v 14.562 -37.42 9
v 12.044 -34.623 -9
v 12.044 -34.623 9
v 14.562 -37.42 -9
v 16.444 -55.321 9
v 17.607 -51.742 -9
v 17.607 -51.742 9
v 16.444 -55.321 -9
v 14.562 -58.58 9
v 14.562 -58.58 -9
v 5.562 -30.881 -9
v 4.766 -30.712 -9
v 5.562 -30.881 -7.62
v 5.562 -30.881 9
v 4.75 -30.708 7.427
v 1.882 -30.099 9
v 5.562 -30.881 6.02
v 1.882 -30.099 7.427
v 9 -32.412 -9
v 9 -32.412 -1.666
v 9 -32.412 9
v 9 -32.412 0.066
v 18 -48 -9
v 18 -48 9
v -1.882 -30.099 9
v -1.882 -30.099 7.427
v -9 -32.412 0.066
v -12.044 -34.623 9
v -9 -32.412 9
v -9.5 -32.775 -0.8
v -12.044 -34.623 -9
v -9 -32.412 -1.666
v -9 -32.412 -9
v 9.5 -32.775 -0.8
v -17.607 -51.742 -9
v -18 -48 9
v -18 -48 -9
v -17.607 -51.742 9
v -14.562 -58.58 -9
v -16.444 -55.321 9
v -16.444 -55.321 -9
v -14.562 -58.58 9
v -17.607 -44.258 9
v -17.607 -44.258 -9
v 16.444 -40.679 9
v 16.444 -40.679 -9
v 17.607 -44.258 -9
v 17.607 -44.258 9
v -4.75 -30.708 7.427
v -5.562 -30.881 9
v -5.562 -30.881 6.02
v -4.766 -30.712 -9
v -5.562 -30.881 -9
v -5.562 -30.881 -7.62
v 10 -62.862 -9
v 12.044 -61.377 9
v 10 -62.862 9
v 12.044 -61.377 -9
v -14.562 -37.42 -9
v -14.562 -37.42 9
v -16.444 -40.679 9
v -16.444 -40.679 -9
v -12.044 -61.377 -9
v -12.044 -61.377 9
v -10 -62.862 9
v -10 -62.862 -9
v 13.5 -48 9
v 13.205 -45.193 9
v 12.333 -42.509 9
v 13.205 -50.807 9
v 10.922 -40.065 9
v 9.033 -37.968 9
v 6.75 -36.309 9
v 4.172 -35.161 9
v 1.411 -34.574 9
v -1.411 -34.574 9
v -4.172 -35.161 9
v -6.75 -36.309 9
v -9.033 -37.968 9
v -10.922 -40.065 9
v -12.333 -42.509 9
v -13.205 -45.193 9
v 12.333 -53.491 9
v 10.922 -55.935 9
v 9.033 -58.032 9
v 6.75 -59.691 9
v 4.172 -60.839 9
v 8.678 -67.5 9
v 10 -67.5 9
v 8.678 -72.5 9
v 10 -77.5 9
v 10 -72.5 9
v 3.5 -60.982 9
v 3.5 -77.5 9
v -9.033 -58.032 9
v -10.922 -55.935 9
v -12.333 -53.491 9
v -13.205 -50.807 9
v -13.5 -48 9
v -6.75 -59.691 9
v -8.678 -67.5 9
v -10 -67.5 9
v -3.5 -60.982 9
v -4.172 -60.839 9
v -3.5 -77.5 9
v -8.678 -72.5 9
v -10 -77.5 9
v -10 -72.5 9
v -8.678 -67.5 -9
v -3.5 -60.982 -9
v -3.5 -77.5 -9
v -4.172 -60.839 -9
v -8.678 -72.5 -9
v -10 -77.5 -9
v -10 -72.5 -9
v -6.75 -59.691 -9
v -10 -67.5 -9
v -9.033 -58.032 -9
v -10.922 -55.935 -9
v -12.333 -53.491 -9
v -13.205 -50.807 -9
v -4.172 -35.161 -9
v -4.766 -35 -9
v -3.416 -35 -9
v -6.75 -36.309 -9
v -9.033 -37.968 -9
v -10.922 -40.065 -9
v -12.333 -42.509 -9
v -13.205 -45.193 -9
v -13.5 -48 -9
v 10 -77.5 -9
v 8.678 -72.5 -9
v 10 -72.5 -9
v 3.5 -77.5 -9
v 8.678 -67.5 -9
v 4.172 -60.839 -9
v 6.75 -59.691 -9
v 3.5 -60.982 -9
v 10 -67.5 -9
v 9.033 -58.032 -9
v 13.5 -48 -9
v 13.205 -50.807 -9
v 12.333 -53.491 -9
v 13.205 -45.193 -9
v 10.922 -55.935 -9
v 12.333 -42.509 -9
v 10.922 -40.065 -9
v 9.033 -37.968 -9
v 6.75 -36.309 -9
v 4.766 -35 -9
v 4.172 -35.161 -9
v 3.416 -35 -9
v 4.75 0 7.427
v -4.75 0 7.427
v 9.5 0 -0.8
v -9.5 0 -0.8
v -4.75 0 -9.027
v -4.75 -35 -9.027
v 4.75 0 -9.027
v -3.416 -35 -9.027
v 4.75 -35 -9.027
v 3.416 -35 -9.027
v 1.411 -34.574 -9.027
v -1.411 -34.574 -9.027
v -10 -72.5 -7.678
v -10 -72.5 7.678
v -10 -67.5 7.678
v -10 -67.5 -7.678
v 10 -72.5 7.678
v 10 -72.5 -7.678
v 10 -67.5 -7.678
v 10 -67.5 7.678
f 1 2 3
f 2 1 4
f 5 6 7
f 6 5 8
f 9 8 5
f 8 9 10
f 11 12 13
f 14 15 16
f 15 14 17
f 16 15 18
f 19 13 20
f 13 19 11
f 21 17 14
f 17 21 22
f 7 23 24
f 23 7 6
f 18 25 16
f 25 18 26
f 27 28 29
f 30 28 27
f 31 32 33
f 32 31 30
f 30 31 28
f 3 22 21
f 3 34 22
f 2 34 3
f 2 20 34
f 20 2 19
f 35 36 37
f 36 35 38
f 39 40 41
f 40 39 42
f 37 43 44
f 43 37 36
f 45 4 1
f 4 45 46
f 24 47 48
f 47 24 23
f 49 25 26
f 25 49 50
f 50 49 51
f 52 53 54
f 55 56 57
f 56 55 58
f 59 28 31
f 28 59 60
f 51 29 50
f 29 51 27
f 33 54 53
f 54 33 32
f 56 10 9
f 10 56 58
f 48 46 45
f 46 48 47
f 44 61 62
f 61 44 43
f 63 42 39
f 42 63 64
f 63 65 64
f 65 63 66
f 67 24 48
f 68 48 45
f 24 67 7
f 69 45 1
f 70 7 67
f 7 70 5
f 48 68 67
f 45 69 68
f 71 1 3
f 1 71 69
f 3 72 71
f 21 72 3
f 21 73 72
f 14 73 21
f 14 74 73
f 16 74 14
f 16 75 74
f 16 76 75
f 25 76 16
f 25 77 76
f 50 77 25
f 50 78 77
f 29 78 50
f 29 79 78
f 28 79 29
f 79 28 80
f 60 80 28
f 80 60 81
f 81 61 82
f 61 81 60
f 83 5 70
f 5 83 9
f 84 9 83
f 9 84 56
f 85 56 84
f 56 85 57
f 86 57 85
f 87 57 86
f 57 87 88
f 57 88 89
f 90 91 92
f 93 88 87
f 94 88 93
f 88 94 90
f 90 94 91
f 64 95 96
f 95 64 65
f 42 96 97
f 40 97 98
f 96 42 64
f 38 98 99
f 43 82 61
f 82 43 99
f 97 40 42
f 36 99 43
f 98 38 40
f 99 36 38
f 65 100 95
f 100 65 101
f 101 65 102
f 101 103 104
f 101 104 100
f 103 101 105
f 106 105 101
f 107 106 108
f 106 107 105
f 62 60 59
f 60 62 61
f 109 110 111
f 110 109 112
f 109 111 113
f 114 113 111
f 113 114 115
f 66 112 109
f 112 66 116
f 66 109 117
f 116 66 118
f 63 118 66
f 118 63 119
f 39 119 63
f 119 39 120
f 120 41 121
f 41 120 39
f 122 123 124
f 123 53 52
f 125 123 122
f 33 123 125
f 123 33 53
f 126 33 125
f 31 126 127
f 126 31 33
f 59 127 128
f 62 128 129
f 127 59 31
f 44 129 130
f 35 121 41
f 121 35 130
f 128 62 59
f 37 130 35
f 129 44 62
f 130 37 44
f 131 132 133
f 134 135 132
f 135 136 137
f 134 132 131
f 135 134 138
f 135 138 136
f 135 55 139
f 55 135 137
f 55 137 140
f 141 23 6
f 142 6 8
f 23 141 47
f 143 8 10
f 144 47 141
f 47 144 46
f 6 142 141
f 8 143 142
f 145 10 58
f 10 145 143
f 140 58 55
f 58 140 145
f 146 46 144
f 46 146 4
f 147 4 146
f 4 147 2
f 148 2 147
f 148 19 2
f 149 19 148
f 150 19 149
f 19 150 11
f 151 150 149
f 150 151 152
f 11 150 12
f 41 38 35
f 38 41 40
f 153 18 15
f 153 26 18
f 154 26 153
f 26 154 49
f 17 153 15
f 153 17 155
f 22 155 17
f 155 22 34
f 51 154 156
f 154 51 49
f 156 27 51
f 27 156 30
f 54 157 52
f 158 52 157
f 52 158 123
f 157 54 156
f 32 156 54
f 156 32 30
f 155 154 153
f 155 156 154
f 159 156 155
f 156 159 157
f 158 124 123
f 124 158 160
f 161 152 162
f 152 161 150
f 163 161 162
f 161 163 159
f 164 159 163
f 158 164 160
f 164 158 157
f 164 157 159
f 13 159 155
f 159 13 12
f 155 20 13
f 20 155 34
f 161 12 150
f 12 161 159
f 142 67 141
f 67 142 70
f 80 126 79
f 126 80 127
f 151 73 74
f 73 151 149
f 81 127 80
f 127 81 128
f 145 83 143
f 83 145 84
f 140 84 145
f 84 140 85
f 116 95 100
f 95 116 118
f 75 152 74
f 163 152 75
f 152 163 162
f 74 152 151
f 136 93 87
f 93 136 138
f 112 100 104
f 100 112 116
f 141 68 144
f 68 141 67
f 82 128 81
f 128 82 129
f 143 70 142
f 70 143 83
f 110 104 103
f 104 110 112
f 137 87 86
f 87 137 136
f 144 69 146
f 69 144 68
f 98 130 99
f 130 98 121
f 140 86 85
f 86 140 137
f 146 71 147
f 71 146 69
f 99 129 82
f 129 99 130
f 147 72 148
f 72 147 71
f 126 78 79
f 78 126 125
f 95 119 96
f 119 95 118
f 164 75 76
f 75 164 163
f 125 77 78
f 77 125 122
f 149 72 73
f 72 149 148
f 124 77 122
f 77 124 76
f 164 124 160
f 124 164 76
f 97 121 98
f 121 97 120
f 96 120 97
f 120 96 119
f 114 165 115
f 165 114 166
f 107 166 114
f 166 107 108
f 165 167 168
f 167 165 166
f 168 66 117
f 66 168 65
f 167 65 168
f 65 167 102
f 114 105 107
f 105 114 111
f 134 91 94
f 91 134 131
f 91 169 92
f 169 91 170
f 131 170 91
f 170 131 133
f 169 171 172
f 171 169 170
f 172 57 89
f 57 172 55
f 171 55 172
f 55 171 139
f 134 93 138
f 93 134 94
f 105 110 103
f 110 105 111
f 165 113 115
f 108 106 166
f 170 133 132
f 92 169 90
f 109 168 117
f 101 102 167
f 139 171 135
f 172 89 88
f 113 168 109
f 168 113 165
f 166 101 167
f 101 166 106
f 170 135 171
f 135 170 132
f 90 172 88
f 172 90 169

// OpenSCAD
rotate([90, 0, 0]){

difference() 
{
//odecet pro zarezy na utazeni


difference() 
{ 
// ode�et distan�n� mezery


union() 
{
// p�i�ten� patic pro sta�en�

difference() 
{ 
// diffference pro  otvor pro osazen� na ty�



union() 
{
// union pro v�lec napojen� na cylinder pro zasazen� do rukojeti

union() 
// union pro p�ipojen� cylinderu na v�lec
{


//cylinder(h = 14, r1 = 17, r2 = 10, center = true); 
//cylinder-nepouzite skoseni napojeni tyce pro usazeni v rukojeti

//zakladn�
#translate([0,9,48]) rotate ([90,0,0])cylinder(h = 18, r=18);
// 40 je nastavena vnitrni prumer na 35 a vnejsi na 40
        
} 
translate([0,-0.8,0]) rotate ([0,0,0]) cylinder(h=35, r=9.5,$fn=6); 
// umisteni ctverce pro dosazeni do rukojeti
//tloustka operky je 4mm + 14mm pro zesileni
//19 je posun nahoru a dolu/////35 vyska propojky
}
translate([0,10,48]) rotate ([90,0,0])cylinder(h = 20, r=13.5);
// odecitaci valec pro otvor na osazen� ty�e

//27 je vnitrni prumer

}
translate([0,0,70]) rotate ([90,0,0]) cube(size = [20,15,18], center = true);
//sloupky pro utazeni
}
translate([0,10,80]) rotate ([0,0,0])cube(size = [7,50,40], center = true);
//odecet distancni mezery
}        

difference(){

translate([0,0,70]) rotate ([0,0,45]) cube(size = [30,30,5], center = true);
translate([0,0,70]) rotate ([0,0,45]) cube(size = [25,25,15], center = true);
}}  
//odecet od krychle je odectena mesi krychle cimz vznikne cosi aka ctvercovy toroid kterym je az odectena vlastni stahovaci operka


//# pro zviditeleneni
//priblizeni shift+prav tlacitko mysi+ pousouvani dopredu/dozadu
}
